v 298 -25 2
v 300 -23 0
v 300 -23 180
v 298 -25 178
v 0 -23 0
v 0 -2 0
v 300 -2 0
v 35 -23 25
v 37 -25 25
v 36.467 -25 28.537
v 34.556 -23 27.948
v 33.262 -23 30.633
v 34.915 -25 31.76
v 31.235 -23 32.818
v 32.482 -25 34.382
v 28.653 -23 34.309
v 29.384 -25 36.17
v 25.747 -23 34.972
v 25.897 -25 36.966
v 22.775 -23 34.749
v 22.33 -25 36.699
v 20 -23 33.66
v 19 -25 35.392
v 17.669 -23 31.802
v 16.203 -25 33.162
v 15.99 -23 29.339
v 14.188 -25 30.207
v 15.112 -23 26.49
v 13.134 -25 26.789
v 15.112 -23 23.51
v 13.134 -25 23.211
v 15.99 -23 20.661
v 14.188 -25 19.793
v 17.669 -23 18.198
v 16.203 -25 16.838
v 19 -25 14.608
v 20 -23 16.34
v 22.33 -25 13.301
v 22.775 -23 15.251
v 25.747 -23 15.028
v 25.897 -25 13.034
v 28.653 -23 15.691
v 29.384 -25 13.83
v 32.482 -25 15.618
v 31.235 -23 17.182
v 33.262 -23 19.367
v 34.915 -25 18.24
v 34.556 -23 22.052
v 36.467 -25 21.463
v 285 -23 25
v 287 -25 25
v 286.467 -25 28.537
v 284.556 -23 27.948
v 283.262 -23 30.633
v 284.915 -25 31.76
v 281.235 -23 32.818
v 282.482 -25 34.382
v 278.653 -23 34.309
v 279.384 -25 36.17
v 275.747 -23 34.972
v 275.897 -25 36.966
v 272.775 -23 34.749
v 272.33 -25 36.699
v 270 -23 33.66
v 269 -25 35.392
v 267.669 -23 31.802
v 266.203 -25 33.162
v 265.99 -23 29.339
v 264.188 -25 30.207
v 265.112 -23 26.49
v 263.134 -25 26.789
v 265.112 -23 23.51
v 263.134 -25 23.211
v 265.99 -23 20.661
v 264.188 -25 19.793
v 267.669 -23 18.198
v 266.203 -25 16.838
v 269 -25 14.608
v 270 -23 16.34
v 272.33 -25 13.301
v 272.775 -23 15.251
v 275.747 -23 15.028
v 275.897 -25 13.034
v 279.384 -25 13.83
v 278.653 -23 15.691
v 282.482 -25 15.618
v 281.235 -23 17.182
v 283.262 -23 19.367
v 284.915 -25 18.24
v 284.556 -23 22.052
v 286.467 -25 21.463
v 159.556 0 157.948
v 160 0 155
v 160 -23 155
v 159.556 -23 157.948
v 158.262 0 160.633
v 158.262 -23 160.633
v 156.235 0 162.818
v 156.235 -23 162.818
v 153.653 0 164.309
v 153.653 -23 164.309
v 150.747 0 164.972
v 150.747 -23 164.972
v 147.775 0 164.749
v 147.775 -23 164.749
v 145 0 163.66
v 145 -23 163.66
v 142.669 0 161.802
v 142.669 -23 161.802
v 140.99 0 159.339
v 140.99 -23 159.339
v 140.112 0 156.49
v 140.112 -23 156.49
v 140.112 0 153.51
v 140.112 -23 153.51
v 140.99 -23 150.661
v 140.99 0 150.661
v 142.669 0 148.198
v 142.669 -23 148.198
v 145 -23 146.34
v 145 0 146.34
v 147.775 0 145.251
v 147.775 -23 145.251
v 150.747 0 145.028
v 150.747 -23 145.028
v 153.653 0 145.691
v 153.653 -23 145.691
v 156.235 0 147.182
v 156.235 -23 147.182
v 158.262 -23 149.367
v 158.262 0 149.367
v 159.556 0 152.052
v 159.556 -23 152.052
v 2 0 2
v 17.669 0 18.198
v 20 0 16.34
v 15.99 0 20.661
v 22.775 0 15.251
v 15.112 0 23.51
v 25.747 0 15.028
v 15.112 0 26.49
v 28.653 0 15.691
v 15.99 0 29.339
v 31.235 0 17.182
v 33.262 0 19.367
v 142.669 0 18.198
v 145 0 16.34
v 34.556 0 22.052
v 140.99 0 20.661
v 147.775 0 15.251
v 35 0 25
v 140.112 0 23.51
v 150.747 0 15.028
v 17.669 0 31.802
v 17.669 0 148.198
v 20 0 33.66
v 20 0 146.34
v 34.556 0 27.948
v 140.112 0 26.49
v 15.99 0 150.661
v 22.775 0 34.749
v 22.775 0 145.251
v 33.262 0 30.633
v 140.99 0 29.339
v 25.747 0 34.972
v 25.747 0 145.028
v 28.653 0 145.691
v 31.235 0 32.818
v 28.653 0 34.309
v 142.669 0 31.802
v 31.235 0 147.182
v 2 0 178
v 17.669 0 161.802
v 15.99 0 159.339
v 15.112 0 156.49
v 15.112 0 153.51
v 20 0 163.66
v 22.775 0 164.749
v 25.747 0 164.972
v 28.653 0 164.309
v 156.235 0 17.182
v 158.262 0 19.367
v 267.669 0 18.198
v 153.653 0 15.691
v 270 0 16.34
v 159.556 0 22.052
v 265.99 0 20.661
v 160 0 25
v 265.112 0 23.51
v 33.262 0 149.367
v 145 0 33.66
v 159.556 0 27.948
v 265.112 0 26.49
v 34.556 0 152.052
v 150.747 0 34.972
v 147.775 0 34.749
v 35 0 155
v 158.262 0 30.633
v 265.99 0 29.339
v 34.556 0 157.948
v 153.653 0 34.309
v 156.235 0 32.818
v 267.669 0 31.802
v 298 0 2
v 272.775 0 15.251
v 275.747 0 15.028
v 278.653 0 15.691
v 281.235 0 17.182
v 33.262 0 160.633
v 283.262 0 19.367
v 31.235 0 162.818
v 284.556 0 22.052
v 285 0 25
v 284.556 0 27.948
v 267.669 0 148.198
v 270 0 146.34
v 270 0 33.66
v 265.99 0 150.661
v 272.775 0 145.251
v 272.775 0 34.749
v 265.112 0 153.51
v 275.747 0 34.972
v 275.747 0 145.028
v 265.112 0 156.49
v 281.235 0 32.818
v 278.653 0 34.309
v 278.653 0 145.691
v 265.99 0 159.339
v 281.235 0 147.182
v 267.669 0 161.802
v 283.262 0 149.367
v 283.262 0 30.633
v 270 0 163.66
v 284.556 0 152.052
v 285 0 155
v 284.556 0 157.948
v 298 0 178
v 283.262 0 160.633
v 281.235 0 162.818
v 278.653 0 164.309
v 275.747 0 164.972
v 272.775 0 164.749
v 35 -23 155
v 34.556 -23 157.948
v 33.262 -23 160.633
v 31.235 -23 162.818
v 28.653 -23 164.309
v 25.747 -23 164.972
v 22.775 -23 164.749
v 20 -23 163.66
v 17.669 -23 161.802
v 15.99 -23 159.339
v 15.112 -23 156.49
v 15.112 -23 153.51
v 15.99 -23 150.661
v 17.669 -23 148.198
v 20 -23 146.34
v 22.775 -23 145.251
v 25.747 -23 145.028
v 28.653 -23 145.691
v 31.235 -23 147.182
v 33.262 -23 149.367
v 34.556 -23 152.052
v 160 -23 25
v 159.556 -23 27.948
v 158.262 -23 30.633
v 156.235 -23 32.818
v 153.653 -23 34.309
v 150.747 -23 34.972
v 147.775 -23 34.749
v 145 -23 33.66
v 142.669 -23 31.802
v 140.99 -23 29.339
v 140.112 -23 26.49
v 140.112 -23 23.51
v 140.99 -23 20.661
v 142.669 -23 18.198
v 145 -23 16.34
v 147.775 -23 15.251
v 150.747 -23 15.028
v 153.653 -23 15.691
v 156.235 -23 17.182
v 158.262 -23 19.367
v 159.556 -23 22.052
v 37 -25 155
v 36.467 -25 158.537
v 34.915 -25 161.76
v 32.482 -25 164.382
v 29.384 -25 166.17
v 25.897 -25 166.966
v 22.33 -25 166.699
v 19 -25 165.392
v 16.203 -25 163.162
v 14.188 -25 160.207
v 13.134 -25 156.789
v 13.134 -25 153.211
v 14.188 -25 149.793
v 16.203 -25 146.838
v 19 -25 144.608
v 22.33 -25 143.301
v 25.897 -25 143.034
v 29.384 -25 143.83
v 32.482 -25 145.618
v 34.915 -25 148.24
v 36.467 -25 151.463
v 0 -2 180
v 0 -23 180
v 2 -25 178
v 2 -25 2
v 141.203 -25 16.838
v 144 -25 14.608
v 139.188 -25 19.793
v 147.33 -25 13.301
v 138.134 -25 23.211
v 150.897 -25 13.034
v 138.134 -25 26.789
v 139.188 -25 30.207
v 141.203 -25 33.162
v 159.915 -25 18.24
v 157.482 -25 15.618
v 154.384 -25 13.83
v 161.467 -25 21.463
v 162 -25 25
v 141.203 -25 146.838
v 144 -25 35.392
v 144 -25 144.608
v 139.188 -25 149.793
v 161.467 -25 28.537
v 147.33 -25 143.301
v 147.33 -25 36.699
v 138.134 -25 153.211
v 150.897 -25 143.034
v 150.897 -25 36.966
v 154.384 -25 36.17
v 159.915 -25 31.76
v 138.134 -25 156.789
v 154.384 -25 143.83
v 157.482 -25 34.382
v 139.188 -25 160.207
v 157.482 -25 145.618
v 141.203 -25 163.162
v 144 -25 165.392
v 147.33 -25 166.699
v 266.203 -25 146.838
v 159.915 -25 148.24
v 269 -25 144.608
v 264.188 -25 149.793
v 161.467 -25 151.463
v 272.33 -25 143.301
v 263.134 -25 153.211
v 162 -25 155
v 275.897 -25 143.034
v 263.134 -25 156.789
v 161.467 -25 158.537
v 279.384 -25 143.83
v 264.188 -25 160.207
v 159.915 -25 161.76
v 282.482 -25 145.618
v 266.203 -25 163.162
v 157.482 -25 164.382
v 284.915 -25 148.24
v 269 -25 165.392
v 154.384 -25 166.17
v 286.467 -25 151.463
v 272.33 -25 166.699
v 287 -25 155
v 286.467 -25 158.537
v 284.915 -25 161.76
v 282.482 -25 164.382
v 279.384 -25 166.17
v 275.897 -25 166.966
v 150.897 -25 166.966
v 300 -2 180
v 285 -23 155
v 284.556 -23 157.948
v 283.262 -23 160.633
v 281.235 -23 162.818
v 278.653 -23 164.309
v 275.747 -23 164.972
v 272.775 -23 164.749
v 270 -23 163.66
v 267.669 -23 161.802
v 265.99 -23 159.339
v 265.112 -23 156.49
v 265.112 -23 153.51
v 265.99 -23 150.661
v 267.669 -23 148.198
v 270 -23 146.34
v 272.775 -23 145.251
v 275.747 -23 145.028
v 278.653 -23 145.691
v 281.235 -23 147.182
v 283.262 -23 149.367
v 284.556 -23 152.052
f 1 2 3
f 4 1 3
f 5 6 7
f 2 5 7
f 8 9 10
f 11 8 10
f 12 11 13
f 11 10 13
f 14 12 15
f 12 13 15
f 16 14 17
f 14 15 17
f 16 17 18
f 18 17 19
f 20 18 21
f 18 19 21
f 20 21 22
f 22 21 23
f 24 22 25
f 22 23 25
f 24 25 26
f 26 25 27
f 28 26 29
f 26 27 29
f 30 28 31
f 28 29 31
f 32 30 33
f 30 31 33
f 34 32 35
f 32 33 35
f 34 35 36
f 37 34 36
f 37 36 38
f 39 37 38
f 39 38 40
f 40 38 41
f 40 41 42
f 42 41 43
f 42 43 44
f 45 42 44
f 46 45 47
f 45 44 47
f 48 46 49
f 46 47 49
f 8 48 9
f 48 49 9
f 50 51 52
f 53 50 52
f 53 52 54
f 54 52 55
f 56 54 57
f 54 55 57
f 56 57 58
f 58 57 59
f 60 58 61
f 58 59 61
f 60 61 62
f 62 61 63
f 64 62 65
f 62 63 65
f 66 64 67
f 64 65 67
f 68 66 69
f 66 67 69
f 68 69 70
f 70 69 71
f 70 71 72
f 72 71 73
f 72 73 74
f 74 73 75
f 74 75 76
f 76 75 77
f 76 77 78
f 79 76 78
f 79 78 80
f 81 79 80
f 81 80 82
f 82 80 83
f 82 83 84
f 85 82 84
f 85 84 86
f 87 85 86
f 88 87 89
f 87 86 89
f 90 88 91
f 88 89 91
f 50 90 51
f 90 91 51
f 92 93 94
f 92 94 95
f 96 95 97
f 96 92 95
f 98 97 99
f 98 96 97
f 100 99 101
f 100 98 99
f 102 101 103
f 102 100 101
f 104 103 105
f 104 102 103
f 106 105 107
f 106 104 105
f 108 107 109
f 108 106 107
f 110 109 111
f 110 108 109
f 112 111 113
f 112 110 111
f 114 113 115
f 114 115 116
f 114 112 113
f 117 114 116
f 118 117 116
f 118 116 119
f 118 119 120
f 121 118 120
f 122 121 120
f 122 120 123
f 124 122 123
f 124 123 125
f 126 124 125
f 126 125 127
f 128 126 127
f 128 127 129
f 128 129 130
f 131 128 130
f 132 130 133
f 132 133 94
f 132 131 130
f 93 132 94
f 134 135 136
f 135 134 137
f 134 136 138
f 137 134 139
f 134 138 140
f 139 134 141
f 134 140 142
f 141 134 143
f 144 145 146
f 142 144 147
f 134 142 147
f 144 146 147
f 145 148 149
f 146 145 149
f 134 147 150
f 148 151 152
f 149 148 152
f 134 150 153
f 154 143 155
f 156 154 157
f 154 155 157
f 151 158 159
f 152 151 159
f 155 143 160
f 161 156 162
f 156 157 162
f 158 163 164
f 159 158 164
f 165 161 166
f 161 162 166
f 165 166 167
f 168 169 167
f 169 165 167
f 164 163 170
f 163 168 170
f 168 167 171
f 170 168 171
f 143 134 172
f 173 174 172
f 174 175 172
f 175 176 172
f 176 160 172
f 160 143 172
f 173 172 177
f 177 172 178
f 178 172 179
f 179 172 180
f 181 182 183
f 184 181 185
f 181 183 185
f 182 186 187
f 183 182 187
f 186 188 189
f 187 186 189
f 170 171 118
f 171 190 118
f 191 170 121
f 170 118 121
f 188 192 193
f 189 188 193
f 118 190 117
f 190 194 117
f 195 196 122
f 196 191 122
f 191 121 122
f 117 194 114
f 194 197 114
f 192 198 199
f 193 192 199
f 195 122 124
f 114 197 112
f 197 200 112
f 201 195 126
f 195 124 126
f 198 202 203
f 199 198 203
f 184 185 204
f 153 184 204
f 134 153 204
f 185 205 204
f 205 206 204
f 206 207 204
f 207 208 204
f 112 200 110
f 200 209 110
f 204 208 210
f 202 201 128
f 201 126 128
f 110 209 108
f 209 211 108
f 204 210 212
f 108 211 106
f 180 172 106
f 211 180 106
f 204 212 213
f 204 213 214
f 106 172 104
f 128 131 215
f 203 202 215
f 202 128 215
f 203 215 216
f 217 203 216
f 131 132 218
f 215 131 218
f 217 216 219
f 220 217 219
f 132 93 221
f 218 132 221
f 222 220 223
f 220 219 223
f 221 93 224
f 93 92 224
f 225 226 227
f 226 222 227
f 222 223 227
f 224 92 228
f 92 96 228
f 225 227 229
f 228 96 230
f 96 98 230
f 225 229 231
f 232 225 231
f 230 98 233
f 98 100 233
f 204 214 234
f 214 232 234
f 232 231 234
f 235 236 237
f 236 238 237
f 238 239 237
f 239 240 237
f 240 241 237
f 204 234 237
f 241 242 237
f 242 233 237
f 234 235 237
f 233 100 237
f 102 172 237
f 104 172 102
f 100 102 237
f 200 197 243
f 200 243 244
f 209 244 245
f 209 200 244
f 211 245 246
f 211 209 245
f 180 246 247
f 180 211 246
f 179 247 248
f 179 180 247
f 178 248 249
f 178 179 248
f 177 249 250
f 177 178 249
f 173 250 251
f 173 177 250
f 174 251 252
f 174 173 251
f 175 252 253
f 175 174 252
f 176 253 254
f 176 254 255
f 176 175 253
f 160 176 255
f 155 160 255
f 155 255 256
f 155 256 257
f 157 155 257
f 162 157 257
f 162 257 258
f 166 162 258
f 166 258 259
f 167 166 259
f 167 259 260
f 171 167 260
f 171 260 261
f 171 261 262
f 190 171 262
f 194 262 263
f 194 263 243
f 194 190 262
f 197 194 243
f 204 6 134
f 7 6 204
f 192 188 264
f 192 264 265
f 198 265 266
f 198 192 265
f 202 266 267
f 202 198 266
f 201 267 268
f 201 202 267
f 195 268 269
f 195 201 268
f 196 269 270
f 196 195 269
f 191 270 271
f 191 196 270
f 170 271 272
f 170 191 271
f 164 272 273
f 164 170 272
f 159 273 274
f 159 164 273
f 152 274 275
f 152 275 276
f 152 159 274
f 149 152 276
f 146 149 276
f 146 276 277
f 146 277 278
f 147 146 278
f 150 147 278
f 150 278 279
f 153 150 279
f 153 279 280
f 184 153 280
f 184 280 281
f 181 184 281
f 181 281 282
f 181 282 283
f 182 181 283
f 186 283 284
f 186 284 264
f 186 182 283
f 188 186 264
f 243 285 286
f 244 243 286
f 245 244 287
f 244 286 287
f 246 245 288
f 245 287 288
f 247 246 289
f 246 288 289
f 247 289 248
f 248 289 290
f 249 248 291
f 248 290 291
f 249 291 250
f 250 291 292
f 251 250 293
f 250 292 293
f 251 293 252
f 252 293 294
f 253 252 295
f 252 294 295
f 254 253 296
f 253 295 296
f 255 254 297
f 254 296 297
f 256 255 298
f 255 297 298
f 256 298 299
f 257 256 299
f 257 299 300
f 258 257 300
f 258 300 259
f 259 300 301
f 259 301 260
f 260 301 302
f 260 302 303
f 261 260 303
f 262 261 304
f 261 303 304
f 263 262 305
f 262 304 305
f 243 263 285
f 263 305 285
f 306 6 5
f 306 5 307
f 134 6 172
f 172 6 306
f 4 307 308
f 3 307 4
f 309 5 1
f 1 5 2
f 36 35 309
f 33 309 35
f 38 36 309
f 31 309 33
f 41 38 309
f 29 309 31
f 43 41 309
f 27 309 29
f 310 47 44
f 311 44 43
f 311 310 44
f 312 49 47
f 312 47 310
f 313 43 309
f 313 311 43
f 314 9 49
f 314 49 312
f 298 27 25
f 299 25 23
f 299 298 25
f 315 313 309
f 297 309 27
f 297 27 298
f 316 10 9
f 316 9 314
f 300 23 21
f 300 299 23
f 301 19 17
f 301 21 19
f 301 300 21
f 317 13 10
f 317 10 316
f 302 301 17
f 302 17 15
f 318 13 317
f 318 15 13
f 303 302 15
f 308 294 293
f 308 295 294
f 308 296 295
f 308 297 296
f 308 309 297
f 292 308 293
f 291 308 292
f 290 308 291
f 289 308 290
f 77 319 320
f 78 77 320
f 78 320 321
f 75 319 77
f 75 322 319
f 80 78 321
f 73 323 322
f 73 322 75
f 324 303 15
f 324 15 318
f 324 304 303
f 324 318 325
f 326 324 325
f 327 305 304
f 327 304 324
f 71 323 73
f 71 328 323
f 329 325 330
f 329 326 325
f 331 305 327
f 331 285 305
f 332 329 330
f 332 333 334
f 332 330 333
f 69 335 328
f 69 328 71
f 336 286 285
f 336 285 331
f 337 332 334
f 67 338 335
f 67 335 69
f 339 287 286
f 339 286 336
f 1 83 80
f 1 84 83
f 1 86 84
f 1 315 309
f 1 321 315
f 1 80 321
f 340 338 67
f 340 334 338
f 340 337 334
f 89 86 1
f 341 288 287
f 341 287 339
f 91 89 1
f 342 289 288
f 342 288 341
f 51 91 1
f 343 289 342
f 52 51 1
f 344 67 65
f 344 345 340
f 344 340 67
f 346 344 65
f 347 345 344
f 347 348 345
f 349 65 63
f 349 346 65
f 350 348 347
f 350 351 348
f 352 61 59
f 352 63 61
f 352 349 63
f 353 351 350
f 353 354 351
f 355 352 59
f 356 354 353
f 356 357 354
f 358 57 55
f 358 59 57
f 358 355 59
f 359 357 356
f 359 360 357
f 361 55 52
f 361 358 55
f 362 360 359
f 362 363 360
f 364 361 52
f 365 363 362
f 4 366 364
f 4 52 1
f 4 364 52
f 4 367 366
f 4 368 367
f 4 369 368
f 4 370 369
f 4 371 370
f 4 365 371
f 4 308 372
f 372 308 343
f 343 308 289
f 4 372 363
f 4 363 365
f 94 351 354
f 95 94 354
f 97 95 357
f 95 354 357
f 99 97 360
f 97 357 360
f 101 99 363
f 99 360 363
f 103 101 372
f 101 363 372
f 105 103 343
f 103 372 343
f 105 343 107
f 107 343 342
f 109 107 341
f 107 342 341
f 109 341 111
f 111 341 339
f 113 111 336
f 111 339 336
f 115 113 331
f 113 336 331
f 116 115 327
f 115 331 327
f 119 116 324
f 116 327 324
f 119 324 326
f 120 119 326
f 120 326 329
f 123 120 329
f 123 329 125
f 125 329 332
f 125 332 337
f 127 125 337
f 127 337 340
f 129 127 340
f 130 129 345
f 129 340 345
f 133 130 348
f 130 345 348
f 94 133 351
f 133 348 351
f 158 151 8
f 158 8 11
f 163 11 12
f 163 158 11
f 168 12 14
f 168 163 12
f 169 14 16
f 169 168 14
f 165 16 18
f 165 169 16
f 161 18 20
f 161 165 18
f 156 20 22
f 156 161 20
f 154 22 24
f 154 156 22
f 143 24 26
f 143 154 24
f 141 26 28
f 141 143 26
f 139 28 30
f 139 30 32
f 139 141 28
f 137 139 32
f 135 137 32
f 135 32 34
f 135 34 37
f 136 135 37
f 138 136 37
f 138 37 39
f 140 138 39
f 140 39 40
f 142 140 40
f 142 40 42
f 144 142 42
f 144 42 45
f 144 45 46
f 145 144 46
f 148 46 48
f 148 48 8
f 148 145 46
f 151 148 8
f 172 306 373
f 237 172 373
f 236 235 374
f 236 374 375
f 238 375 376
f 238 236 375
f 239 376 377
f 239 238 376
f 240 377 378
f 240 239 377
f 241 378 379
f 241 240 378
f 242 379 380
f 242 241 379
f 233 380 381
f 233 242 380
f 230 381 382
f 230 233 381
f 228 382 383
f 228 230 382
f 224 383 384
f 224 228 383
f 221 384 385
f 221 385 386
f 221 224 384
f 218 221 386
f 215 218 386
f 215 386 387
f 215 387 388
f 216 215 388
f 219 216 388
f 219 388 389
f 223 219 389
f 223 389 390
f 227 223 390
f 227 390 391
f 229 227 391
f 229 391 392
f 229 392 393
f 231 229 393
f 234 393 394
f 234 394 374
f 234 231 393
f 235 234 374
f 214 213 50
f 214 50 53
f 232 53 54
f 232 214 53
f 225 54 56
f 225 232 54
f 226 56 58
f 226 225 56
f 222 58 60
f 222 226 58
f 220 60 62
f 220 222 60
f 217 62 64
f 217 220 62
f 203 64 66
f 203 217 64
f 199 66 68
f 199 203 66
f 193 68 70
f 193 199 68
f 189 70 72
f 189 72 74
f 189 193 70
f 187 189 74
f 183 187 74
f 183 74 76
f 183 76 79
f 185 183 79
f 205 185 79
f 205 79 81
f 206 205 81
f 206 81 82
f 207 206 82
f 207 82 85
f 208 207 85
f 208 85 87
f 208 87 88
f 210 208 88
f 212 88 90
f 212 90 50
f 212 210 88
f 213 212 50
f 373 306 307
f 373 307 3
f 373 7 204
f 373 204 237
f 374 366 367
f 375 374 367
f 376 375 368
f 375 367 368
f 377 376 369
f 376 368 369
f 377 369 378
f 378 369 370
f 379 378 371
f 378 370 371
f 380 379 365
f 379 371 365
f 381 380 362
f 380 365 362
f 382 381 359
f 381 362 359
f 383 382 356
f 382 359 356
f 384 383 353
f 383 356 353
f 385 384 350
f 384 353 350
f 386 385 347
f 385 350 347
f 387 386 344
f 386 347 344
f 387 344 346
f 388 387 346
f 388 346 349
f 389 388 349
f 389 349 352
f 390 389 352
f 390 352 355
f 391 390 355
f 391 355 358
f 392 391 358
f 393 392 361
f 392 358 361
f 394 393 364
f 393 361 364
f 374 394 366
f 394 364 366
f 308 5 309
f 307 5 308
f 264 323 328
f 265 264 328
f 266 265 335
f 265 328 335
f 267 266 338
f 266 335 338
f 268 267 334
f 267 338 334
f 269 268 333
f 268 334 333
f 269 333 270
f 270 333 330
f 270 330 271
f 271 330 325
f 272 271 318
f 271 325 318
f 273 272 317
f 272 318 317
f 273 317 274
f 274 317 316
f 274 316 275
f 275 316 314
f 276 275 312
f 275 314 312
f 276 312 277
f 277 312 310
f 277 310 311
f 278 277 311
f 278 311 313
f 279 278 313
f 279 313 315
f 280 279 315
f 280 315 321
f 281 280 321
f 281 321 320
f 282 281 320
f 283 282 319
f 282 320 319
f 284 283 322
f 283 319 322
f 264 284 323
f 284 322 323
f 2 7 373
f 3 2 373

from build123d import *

# Parameters (mm, degrees)
F0_W     = 300
F0_H     = 180
F0_R     = 10
F1_DEPTH = 25
F2_SIZE2 = 2
F2_SIZE  = 2
F3_SIZE2 = 2
F3_SIZE  = 2


with BuildPart() as f1:
    # F0 (on Front) → F1 (new body)
    with BuildSketch(Plane.XZ):
        with Locations((150, 90)):
            Rectangle(F0_W, F0_H)
        with Locations((25, 25)):
            Circle(F0_R, mode=Mode.SUBTRACT)
        with Locations((150, 25)):
            Circle(F0_R, mode=Mode.SUBTRACT)
        with Locations((275, 25)):
            Circle(F0_R, mode=Mode.SUBTRACT)
        with Locations((25, 155)):
            Circle(F0_R, mode=Mode.SUBTRACT)
        with Locations((150, 155)):
            Circle(F0_R, mode=Mode.SUBTRACT)
        with Locations((275, 155)):
            Circle(F0_R, mode=Mode.SUBTRACT)
    extrude(amount=F1_DEPTH)

    # F2
    f2_edges = [f1.edges().sort_by_distance(p)[0] for p in [
        (15, -25, 155),
        (15, -25, 25),
        (140, -25, 25),
        (140, -25, 155),
        (265, -25, 155),
        (265, -25, 25),
    ]]
    chamfer(f2_edges, length=F2_SIZE, length2=F2_SIZE2)

    # F3
    f3_edges = [f1.edges().sort_by_distance(p)[0] for p in [
        (300, -25, 90),
        (150, -25, 0),
        (0, -25, 90),
        (150, -25, 180),
        (150, 0, 0),
        (0, 0, 90),
        (300, 0, 90),
        (150, 0, 180),
    ]]
    chamfer(f3_edges, length=F3_SIZE, length2=F3_SIZE2)


solid = f1.part
